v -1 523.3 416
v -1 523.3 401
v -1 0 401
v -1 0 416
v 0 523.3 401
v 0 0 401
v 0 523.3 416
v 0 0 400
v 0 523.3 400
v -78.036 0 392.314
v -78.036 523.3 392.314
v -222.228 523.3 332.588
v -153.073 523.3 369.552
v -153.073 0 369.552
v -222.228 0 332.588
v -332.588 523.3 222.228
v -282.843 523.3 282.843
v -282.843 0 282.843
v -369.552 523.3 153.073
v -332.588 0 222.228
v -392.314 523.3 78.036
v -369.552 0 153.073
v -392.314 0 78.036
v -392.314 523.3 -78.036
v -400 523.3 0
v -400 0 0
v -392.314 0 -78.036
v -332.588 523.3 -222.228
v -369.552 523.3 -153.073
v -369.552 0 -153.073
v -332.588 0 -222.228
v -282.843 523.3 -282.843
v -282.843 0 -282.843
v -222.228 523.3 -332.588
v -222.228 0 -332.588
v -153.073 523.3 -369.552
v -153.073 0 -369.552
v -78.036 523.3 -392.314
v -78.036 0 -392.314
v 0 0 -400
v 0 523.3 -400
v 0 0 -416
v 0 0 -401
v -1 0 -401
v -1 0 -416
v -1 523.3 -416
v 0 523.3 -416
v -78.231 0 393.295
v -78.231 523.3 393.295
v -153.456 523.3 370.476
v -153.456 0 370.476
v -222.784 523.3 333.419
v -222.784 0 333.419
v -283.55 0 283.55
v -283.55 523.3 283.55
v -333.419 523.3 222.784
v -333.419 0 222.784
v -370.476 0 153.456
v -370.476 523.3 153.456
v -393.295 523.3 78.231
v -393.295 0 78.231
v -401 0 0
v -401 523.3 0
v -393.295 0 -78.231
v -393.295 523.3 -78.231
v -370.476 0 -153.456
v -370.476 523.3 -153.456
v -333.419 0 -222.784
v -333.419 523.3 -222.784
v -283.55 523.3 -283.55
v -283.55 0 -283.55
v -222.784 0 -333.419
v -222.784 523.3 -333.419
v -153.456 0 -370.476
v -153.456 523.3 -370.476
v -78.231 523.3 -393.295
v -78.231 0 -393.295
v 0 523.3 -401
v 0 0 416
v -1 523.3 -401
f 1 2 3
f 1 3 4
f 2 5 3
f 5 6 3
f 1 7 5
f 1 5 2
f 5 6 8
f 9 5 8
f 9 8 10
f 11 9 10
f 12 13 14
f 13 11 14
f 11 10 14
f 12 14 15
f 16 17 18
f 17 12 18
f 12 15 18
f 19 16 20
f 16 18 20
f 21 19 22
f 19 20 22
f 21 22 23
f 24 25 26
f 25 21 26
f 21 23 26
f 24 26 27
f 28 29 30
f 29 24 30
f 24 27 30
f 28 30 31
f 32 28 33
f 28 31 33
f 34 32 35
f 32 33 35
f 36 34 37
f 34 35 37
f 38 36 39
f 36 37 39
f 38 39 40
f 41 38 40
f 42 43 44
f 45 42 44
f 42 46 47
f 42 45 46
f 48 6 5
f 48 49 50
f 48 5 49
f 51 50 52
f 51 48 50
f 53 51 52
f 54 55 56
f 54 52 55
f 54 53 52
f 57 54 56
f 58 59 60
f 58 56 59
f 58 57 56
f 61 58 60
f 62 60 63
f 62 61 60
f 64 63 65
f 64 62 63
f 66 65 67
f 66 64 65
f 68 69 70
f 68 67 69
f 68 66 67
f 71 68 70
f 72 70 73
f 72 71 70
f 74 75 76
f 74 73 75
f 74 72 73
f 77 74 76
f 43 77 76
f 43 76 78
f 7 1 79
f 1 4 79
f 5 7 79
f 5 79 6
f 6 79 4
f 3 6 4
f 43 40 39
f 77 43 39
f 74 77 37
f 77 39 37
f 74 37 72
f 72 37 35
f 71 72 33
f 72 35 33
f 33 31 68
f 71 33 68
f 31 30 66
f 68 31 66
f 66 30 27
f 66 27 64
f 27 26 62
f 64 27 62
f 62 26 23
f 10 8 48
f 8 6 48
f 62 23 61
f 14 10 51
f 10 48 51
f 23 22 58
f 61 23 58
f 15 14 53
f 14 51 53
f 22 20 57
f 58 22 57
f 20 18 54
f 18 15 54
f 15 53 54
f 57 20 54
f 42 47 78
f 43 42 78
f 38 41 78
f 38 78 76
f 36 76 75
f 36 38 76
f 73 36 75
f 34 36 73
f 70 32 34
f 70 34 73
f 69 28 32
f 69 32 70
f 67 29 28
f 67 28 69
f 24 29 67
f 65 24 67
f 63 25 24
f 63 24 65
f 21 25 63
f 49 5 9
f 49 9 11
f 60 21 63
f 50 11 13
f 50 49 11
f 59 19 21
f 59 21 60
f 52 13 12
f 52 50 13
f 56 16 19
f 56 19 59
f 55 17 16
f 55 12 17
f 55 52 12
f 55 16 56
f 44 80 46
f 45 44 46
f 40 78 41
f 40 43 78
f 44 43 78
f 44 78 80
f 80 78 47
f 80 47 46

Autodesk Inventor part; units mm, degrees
ref_plane "YZ Plane" through (0, 0, 0) normal (1, 0, 0) x (0, 1, 0)
ref_plane "XZ Plane" through (0, 0, 0) normal (0, 1, 0) x (-1, 0, 0)
ref_plane "XY Plane" through (0, 0, 0) normal (0, 0, 1) x (1, 0, 0)
sketch "Sketch1" plane through (0, 0, 0) normal (0, 1, 0) x (-1, 0, 0)
  arc A0 (0, -401) -> (0, 401) centre (0, 0) ccw
  line L0 (0, 0) -> (0, 401) construction
  line L1 (0, 0) -> (0, -401) construction
  arc A1 (0, -400) -> (0, 400) centre (0, 0) ccw
  line L2 (0, 0) -> (0, 400) construction
  line L3 (0, 0) -> (0, -400) construction
  line L4 (0, 401) -> (0, 400)
  line L5 (0, -401) -> (0, -400)
  dimension "d0" = 401
  dimension "d1" = 180
  dimension "d2" = 400
  dimension "d3" = 180
extrude "Extrusion1" add sketch "Sketch1" along normal blind 523.3
sketch "Sketch2" plane through (0, 0, 0) normal (0, 1, 0) x (-1, 0, 0)
  line L0 (0, 401) -> (1, 401)
  line L1 (1, 401) -> (1, 416)
  line L2 (1, 416) -> (0, 416)
  line L3 (0, 416) -> (0, 401)
  point P0 (0, 0)
  dimension "d6" = 1
  dimension "d7" = 15
extrude "Extrusion2" add sketch "Sketch2" along normal blind 523.3
sketch "Sketch3" plane through (0, 0, 0) normal (0, 1, 0) x (-1, 0, 0)
  line L0 (0, -401) -> (1, -401)
  line L1 (1, -401) -> (1, -416)
  line L2 (1, -416) -> (0, -416)
  line L3 (0, -416) -> (0, -401)
  point P0 (0, 0)
  dimension "d12" = 1
  dimension "d13" = 15
extrude "Extrusion3" add sketch "Sketch3" along normal blind 523.3
properties part number "New Band Design"
